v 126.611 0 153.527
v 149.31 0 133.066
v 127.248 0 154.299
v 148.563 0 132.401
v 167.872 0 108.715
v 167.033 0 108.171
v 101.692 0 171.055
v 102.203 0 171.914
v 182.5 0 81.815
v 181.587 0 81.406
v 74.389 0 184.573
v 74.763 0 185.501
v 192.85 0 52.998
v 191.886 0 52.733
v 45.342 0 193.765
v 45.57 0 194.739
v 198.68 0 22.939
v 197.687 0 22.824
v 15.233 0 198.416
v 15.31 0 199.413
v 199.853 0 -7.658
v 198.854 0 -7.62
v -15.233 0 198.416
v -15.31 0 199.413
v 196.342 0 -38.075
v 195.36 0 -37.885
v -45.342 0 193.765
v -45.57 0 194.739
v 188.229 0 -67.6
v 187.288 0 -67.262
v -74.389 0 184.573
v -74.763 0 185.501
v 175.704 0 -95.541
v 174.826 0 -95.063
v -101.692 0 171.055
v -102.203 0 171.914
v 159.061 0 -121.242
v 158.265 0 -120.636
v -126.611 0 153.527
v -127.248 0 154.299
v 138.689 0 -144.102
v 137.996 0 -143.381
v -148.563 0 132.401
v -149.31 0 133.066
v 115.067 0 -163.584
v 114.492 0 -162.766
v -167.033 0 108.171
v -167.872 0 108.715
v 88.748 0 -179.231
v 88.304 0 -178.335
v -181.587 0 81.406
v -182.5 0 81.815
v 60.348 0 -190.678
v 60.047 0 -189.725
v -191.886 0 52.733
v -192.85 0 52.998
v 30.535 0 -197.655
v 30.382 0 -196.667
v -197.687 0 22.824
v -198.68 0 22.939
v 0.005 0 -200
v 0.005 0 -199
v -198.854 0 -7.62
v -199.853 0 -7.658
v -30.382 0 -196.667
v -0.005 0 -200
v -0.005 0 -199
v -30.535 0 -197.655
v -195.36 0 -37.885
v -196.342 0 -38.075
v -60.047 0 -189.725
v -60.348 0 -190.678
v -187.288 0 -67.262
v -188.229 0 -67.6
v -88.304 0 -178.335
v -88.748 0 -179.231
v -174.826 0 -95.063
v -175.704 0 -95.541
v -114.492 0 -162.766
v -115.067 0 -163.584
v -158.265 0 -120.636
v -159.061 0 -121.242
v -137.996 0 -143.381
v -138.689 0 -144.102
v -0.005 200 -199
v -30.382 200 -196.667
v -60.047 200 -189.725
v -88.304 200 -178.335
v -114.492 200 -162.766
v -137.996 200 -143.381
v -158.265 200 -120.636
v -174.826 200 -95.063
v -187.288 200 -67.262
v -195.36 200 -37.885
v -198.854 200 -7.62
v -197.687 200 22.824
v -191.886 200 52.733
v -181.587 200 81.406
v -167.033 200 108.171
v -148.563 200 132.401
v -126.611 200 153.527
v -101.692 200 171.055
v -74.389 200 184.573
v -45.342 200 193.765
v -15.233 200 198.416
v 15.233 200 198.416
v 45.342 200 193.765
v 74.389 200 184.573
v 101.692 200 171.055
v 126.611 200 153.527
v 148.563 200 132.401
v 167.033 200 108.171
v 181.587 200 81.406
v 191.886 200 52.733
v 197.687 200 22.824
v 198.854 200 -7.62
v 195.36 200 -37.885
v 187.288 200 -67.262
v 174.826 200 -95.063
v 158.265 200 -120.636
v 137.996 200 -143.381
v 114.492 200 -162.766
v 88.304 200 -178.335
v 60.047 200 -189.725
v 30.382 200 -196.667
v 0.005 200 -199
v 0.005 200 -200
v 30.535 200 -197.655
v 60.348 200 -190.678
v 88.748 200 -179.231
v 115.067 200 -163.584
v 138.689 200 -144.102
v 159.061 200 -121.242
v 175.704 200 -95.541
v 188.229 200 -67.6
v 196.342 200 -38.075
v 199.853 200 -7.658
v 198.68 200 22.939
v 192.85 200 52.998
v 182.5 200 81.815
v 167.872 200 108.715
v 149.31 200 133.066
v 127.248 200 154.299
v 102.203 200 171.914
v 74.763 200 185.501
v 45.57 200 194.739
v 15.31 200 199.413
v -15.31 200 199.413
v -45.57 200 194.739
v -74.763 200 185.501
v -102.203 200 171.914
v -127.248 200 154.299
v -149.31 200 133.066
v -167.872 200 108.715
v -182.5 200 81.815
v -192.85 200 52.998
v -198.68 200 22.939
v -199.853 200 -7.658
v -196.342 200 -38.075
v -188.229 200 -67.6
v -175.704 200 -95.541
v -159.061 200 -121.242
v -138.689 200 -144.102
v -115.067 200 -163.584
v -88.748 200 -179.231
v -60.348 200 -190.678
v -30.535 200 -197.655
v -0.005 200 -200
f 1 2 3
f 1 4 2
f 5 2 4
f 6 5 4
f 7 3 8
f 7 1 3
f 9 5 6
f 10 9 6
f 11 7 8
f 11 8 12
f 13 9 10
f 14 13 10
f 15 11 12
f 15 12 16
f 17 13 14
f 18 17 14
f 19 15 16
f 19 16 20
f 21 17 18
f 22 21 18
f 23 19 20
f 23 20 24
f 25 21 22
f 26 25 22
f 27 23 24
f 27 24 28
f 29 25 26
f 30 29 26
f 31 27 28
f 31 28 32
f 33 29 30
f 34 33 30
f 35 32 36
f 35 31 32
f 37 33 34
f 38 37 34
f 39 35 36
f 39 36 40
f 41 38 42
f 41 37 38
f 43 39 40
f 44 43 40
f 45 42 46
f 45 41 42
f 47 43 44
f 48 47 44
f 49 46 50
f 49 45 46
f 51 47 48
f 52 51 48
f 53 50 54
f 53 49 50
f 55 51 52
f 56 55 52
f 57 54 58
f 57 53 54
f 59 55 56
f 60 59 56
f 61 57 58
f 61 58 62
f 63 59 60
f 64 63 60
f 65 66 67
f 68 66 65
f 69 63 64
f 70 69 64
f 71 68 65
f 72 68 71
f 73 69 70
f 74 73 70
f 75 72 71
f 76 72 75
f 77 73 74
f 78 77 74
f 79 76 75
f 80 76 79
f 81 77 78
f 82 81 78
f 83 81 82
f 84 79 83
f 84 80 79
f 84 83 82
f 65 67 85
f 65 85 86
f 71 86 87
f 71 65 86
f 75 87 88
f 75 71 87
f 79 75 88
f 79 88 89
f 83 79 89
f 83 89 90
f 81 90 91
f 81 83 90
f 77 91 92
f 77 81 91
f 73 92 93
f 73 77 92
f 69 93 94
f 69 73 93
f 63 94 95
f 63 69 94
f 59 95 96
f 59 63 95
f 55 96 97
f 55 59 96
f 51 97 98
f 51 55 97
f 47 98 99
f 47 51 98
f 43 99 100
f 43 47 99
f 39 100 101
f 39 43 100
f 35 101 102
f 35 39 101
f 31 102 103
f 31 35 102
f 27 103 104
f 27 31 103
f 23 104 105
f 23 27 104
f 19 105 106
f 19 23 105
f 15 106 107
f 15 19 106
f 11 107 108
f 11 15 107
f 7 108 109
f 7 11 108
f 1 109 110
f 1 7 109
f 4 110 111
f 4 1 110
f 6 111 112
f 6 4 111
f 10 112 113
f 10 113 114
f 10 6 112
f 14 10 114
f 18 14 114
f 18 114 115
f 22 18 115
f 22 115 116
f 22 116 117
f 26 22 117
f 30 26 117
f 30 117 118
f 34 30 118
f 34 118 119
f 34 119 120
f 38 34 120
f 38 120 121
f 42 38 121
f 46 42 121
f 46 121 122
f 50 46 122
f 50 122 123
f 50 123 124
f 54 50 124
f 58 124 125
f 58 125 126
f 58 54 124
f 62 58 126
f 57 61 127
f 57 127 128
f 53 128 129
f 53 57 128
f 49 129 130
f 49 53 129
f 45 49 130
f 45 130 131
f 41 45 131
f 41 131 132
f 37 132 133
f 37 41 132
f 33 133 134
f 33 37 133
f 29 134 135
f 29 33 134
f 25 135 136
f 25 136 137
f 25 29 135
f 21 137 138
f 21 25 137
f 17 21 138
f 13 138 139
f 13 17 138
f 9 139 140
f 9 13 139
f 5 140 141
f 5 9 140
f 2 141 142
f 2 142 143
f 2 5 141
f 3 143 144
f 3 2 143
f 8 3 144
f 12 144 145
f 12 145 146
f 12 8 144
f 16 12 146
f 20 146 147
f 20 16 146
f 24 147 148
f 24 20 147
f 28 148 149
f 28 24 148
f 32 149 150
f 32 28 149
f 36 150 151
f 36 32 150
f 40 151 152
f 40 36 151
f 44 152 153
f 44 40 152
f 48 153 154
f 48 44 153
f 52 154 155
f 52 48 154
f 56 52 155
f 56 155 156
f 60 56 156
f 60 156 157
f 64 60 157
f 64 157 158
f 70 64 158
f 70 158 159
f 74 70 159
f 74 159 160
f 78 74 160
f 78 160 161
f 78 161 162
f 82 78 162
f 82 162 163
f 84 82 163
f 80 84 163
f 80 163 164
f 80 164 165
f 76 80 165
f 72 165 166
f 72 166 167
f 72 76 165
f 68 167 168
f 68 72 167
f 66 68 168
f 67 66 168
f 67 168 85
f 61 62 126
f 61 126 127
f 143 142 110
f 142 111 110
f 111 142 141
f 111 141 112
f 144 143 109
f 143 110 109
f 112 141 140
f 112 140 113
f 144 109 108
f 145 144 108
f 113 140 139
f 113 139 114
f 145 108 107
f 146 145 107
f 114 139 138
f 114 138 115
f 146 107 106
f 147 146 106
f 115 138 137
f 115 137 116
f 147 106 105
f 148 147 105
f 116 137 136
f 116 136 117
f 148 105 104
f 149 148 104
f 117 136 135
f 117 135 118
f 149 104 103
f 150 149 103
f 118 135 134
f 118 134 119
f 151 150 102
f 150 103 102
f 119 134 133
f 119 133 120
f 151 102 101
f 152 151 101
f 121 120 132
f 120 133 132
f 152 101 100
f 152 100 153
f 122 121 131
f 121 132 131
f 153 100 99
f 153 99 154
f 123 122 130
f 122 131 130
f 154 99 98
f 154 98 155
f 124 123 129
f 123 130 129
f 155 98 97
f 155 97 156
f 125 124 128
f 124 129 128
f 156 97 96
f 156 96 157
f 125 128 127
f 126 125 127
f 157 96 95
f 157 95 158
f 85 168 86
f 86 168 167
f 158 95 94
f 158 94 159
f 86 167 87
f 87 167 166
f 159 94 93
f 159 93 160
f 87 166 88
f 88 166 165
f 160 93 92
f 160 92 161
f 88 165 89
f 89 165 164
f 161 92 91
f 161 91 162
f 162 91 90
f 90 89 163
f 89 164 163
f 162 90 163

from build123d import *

# Parameters (mm, degrees)
BASE_FLANGE1_DEPTH                    = 200
BASE_FLANGE2_START                    = -1.5
BASE_FLANGE2_DEPTH                    = 1.5
SKETCH9_W                             = 6.25
SKETCH9_H                             = 1.5
F_12_5_12_5_DIAMETER_HOLE2_AT_2_COUNT = 2
F_12_5_12_5_DIAMETER_HOLE2_AT_2_PITCH = 250
F_12_5_12_5_DIAMETER_HOLE2_AT_3_COUNT = 2
F_12_5_12_5_DIAMETER_HOLE2_AT_3_PITCH = 125
F_12_5_12_5_DIAMETER_HOLE2_AT_4_COUNT = 2
F_12_5_12_5_DIAMETER_HOLE2_AT_4_PITCH = 465.111814513
F_12_5_12_5_DIAMETER_HOLE2_AT_5_COUNT = 2
F_12_5_12_5_DIAMETER_HOLE2_AT_5_PITCH = 513.034111926
F_12_5_12_5_DIAMETER_HOLE2_AT_6_COUNT = 2
F_12_5_12_5_DIAMETER_HOLE2_AT_6_PITCH = 448
SKETCH11_W                            = 6.25
SKETCH11_H                            = 1.5
F_12_5_12_5_DIAMETER_HOLE3_AT_2_COUNT = 2
F_12_5_12_5_DIAMETER_HOLE3_AT_2_PITCH = 332
CRVPATTERN1_COUNT                     = 4
CRVPATTERN1_PITCH                     = 125
CRVPATTERN1_COPY_1_SKETCH_W           = 6.25
CRVPATTERN1_COPY_1_SKETCH_H           = 1.5
CRVPATTERN1_COPY_2_SKETCH_W           = 6.25
CRVPATTERN1_COPY_2_SKETCH_H           = 1.5
CRVPATTERN1_COPY_3_SKETCH_W           = 6.25
CRVPATTERN1_COPY_3_SKETCH_H           = 1.5
BASE_FLANGE3_DEPTH                    = 1.5
SKETCH14_W                            = 80
SKETCH14_H                            = 6
SKETCH14_W_2                          = 50
EXTRUDE1_DEPTH                        = 10
CRVPATTERN2_START                     = -81.5
CRVPATTERN2_OUTLINE_W                 = 1.5
CRVPATTERN2_OUTLINE_H                 = 6
CRVPATTERN2_DEPTH                     = 80
CRVPATTERN2_START_2                   = -134.5
CRVPATTERN2_2_OUTLINE_W               = 1.5
CRVPATTERN2_2_OUTLINE_H               = 6
CRVPATTERN2_2_DEPTH                   = 50
SKETCH15_W                            = 6
SKETCH15_H                            = 80
SKETCH15_H_2                          = 50
SKETCH15_H_3                          = 30
SKETCH15_W_2                          = 10
SKETCH15_H_4                          = 10
EXTRUDE2_DEPTH                        = 10


# Read off the part's stored shape, not the designer's step: CrvPattern2
# Sheet-metal steps are written as plain solids
with BuildPart() as part:
    # Sketch1 → Base-Flange1 (new body)
    with BuildSketch(Plane(origin=(0, 0, 0), x_dir=(1, 0, 0), z_dir=(0, 1, 0))):
        with BuildLine():
            ThreePointArc((-0.005, 198.999999937), (0, -199), (0.005, 198.999999937))
            Line((0.005, 198.999999937), (0.005025126, 199.999999937))
            ThreePointArc((0.005025126, 199.999999937), (0, -200), (-0.005025126, 199.999999937))
            Line((-0.005025126, 199.999999937), (-0.005, 198.999999937))
        make_face()
    extrude(amount=BASE_FLANGE1_DEPTH)


with BuildPart() as body_2:
    # Sketch4 → Base-Flange2 (new body)
    with BuildSketch(Plane(origin=(0, 0, 0), x_dir=(1, 0, 0), z_dir=(0, 1, 0)).offset(BASE_FLANGE2_START)):
        Polygon((240, 180), (240, -180), (0, -220), (-240, -180), (-240, 180), (0, 220), align=None)
        with BuildLine():
            Line((143.038535018, 140), (-142.828568571, 140))
            ThreePointArc((-142.828568571, 140), (-200, 0), (-142.828568571, -140))
            Line((-142.828568571, -140), (143.038535018, -140))
            ThreePointArc((143.038535018, -140), (200.15, 0), (143.038535018, 140))
        make_face(mode=Mode.SUBTRACT)
    extrude(amount=BASE_FLANGE2_DEPTH)

    # Sketch9 → Ø12.5 (12.5) Diameter Hole2 (revolve, cut)
    with BuildSketch(Plane(origin=(-224, 0, -125), x_dir=(0, 0, 1), z_dir=(1, 0, 0))):
        with Locations((3.125, 0.75)):
            Rectangle(SKETCH9_W, SKETCH9_H)
    f_12_5_12_5_diameter_hole2 = revolve(axis=Axis((-224, 6.35, -125), (0, -1, 0)), mode=Mode.SUBTRACT)

    # Ø12.5 (12.5) Diameter Hole2 at 2: Ø12.5 (12.5) Diameter Hole2 ×2
    with Locations(*[(0, 0, i * F_12_5_12_5_DIAMETER_HOLE2_AT_2_PITCH) for i in range(1, F_12_5_12_5_DIAMETER_HOLE2_AT_2_COUNT)]):
        add(f_12_5_12_5_diameter_hole2, mode=Mode.SUBTRACT)

    # Ø12.5 (12.5) Diameter Hole2 at 3: Ø12.5 (12.5) Diameter Hole2 ×2
    with Locations(*[(0, 0, i * F_12_5_12_5_DIAMETER_HOLE2_AT_3_PITCH) for i in range(1, F_12_5_12_5_DIAMETER_HOLE2_AT_3_COUNT)]):
        add(f_12_5_12_5_diameter_hole2, mode=Mode.SUBTRACT)

    # Ø12.5 (12.5) Diameter Hole2 at 4: Ø12.5 (12.5) Diameter Hole2 ×2
    with Locations(*[Vector(0.9632092456491202, 0, 0.2687525797012055) * (i * F_12_5_12_5_DIAMETER_HOLE2_AT_4_PITCH) for i in range(1, F_12_5_12_5_DIAMETER_HOLE2_AT_4_COUNT)]):
        add(f_12_5_12_5_diameter_hole2, mode=Mode.SUBTRACT)

    # Ø12.5 (12.5) Diameter Hole2 at 5: Ø12.5 (12.5) Diameter Hole2 ×2
    with Locations(*[Vector(0.8732362811468641, 0, 0.4872970318899912) * (i * F_12_5_12_5_DIAMETER_HOLE2_AT_5_PITCH) for i in range(1, F_12_5_12_5_DIAMETER_HOLE2_AT_5_COUNT)]):
        add(f_12_5_12_5_diameter_hole2, mode=Mode.SUBTRACT)

    # Ø12.5 (12.5) Diameter Hole2 at 6: Ø12.5 (12.5) Diameter Hole2 ×2
    with Locations(*[(i * F_12_5_12_5_DIAMETER_HOLE2_AT_6_PITCH, 0, 0) for i in range(1, F_12_5_12_5_DIAMETER_HOLE2_AT_6_COUNT)]):
        add(f_12_5_12_5_diameter_hole2, mode=Mode.SUBTRACT)

    # Sketch11 → Ø12.5 (12.5) Diameter Hole3 (revolve, cut)
    with BuildSketch(Plane(origin=(-187.5, 0, -166), x_dir=(0, 0, 1), z_dir=(1, 0, 0))):
        with Locations((3.125, 0.75)):
            Rectangle(SKETCH11_W, SKETCH11_H)
    f_12_5_12_5_diameter_hole3 = revolve(axis=Axis((-187.5, 6.35, -166), (0, -1, 0)), mode=Mode.SUBTRACT)

    # Ø12.5 (12.5) Diameter Hole3 at 2: Ø12.5 (12.5) Diameter Hole3 ×2
    with Locations(*[(0, 0, i * F_12_5_12_5_DIAMETER_HOLE3_AT_2_PITCH) for i in range(1, F_12_5_12_5_DIAMETER_HOLE3_AT_2_COUNT)]):
        add(f_12_5_12_5_diameter_hole3, mode=Mode.SUBTRACT)

    # CrvPattern1: Ø12.5 (12.5) Diameter Hole3 ×4
    with Locations(*[(i * CRVPATTERN1_PITCH, 0, 0) for i in range(1, CRVPATTERN1_COUNT)]):
        add(f_12_5_12_5_diameter_hole3, mode=Mode.SUBTRACT)

    # CrvPattern1 copy 1 sketch → CrvPattern1 copy 1 (revolve, cut)
    with BuildSketch(Plane(origin=(-62.5, 0, 166), x_dir=(0, 0, 1), z_dir=(1, 0, 0))):
        with Locations((3.125, 0.75)):
            Rectangle(CRVPATTERN1_COPY_1_SKETCH_W, CRVPATTERN1_COPY_1_SKETCH_H)
    revolve(axis=Axis((-62.5, 6.35, 166), (0, -1, 0)), mode=Mode.SUBTRACT)

    # CrvPattern1 copy 2 sketch → CrvPattern1 copy 2 (revolve, cut)
    with BuildSketch(Plane(origin=(62.5, 0, 166), x_dir=(0, 0, 1), z_dir=(1, 0, 0))):
        with Locations((3.125, 0.75)):
            Rectangle(CRVPATTERN1_COPY_2_SKETCH_W, CRVPATTERN1_COPY_2_SKETCH_H)
    revolve(axis=Axis((62.5, 6.35, 166), (0, -1, 0)), mode=Mode.SUBTRACT)

    # CrvPattern1 copy 3 sketch → CrvPattern1 copy 3 (revolve, cut)
    with BuildSketch(Plane(origin=(187.5, 0, 166), x_dir=(0, 0, 1), z_dir=(1, 0, 0))):
        with Locations((3.125, 0.75)):
            Rectangle(CRVPATTERN1_COPY_3_SKETCH_W, CRVPATTERN1_COPY_3_SKETCH_H)
    revolve(axis=Axis((187.5, 6.35, 166), (0, -1, 0)), mode=Mode.SUBTRACT)

    # Sketch13 → Base-Flange3 (add)
    with BuildSketch(Plane.XZ.offset(1.5)):
        with BuildLine():
            Line((-142.828568571, -140), (143.038535018, -140))
            ThreePointArc((143.038535018, -140), (200.15, 0), (143.038535018, 140))
            Line((143.038535018, 140), (-142.828568571, 140))
            ThreePointArc((-142.828568571, 140), (-200, 0), (-142.828568571, -140))
        make_face()
    extrude(amount=-BASE_FLANGE3_DEPTH)

    # Sketch14 → Extrude1 (cut)
    with BuildSketch(Plane(origin=(0, 0, 0), x_dir=(1, 0, 0), z_dir=(0, 1, 0))):
        with Locations((-41.5, 137)):
            Rectangle(SKETCH14_W, SKETCH14_H)
        with Locations((-109.5, 137)):
            Rectangle(SKETCH14_W_2, SKETCH14_H)
    extrude1 = extrude(amount=-EXTRUDE1_DEPTH, mode=Mode.SUBTRACT)

    # CrvPattern2 outline → CrvPattern2 (cut)
    with BuildSketch(Plane.YZ.offset(CRVPATTERN2_START)):
        with Locations((-0.75, -127.866666667)):
            Rectangle(CRVPATTERN2_OUTLINE_W, CRVPATTERN2_OUTLINE_H)
        with Locations((-0.75, -118.733333333)):
            Rectangle(CRVPATTERN2_OUTLINE_W, CRVPATTERN2_OUTLINE_H)
        with Locations((-0.75, -109.6)):
            Rectangle(CRVPATTERN2_OUTLINE_W, CRVPATTERN2_OUTLINE_H)
        with Locations((-0.75, -100.466666667)):
            Rectangle(CRVPATTERN2_OUTLINE_W, CRVPATTERN2_OUTLINE_H)
        with Locations((-0.75, -91.333333333)):
            Rectangle(CRVPATTERN2_OUTLINE_W, CRVPATTERN2_OUTLINE_H)
        with Locations((-0.75, -82.2)):
            Rectangle(CRVPATTERN2_OUTLINE_W, CRVPATTERN2_OUTLINE_H)
        with Locations((-0.75, -73.066666667)):
            Rectangle(CRVPATTERN2_OUTLINE_W, CRVPATTERN2_OUTLINE_H)
        with Locations((-0.75, -63.933333333)):
            Rectangle(CRVPATTERN2_OUTLINE_W, CRVPATTERN2_OUTLINE_H)
        with Locations((-0.75, -54.8)):
            Rectangle(CRVPATTERN2_OUTLINE_W, CRVPATTERN2_OUTLINE_H)
        with Locations((-0.75, -45.666666667)):
            Rectangle(CRVPATTERN2_OUTLINE_W, CRVPATTERN2_OUTLINE_H)
        with Locations((-0.75, -36.533333333)):
            Rectangle(CRVPATTERN2_OUTLINE_W, CRVPATTERN2_OUTLINE_H)
        with Locations((-0.75, -27.4)):
            Rectangle(CRVPATTERN2_OUTLINE_W, CRVPATTERN2_OUTLINE_H)
        with Locations((-0.75, -18.266666667)):
            Rectangle(CRVPATTERN2_OUTLINE_W, CRVPATTERN2_OUTLINE_H)
        with Locations((-0.75, -9.133333333)):
            Rectangle(CRVPATTERN2_OUTLINE_W, CRVPATTERN2_OUTLINE_H)
        with Locations((-0.75, 0)):
            Rectangle(CRVPATTERN2_OUTLINE_W, CRVPATTERN2_OUTLINE_H)
        with Locations((-0.75, 9.133333333)):
            Rectangle(CRVPATTERN2_OUTLINE_W, CRVPATTERN2_OUTLINE_H)
        with Locations((-0.75, 18.266666667)):
            Rectangle(CRVPATTERN2_OUTLINE_W, CRVPATTERN2_OUTLINE_H)
        with Locations((-0.75, 27.4)):
            Rectangle(CRVPATTERN2_OUTLINE_W, CRVPATTERN2_OUTLINE_H)
        with Locations((-0.75, 36.533333333)):
            Rectangle(CRVPATTERN2_OUTLINE_W, CRVPATTERN2_OUTLINE_H)
        with Locations((-0.75, 45.666666667)):
            Rectangle(CRVPATTERN2_OUTLINE_W, CRVPATTERN2_OUTLINE_H)
        with Locations((-0.75, 54.8)):
            Rectangle(CRVPATTERN2_OUTLINE_W, CRVPATTERN2_OUTLINE_H)
        with Locations((-0.75, 63.933333333)):
            Rectangle(CRVPATTERN2_OUTLINE_W, CRVPATTERN2_OUTLINE_H)
        with Locations((-0.75, 73.066666667)):
            Rectangle(CRVPATTERN2_OUTLINE_W, CRVPATTERN2_OUTLINE_H)
        with Locations((-0.75, 82.2)):
            Rectangle(CRVPATTERN2_OUTLINE_W, CRVPATTERN2_OUTLINE_H)
        with Locations((-0.75, 91.333333333)):
            Rectangle(CRVPATTERN2_OUTLINE_W, CRVPATTERN2_OUTLINE_H)
        with Locations((-0.75, 100.466666667)):
            Rectangle(CRVPATTERN2_OUTLINE_W, CRVPATTERN2_OUTLINE_H)
        with Locations((-0.75, 109.6)):
            Rectangle(CRVPATTERN2_OUTLINE_W, CRVPATTERN2_OUTLINE_H)
        with Locations((-0.75, 118.733333333)):
            Rectangle(CRVPATTERN2_OUTLINE_W, CRVPATTERN2_OUTLINE_H)
        with Locations((-0.75, 127.866666667)):
            Rectangle(CRVPATTERN2_OUTLINE_W, CRVPATTERN2_OUTLINE_H)
        with Locations((-0.75, 137)):
            Rectangle(CRVPATTERN2_OUTLINE_W, CRVPATTERN2_OUTLINE_H)
    crvpattern2 = extrude(amount=CRVPATTERN2_DEPTH, mode=Mode.SUBTRACT)

    # CrvPattern2 2 outline → CrvPattern2 2 (cut)
    with BuildSketch(Plane.YZ.offset(CRVPATTERN2_START_2)):
        with Locations((-0.75, -127.866666667)):
            Rectangle(CRVPATTERN2_2_OUTLINE_W, CRVPATTERN2_2_OUTLINE_H)
        with Locations((-0.75, -118.733333333)):
            Rectangle(CRVPATTERN2_2_OUTLINE_W, CRVPATTERN2_2_OUTLINE_H)
        with Locations((-0.75, -109.6)):
            Rectangle(CRVPATTERN2_2_OUTLINE_W, CRVPATTERN2_2_OUTLINE_H)
        with Locations((-0.75, -100.466666667)):
            Rectangle(CRVPATTERN2_2_OUTLINE_W, CRVPATTERN2_2_OUTLINE_H)
        with Locations((-0.75, -91.333333333)):
            Rectangle(CRVPATTERN2_2_OUTLINE_W, CRVPATTERN2_2_OUTLINE_H)
        with Locations((-0.75, -82.2)):
            Rectangle(CRVPATTERN2_2_OUTLINE_W, CRVPATTERN2_2_OUTLINE_H)
        with Locations((-0.75, -73.066666667)):
            Rectangle(CRVPATTERN2_2_OUTLINE_W, CRVPATTERN2_2_OUTLINE_H)
        with Locations((-0.75, -63.933333333)):
            Rectangle(CRVPATTERN2_2_OUTLINE_W, CRVPATTERN2_2_OUTLINE_H)
        with Locations((-0.75, -54.8)):
            Rectangle(CRVPATTERN2_2_OUTLINE_W, CRVPATTERN2_2_OUTLINE_H)
        with Locations((-0.75, -45.666666667)):
            Rectangle(CRVPATTERN2_2_OUTLINE_W, CRVPATTERN2_2_OUTLINE_H)
        with Locations((-0.75, -36.533333333)):
            Rectangle(CRVPATTERN2_2_OUTLINE_W, CRVPATTERN2_2_OUTLINE_H)
        with Locations((-0.75, -27.4)):
            Rectangle(CRVPATTERN2_2_OUTLINE_W, CRVPATTERN2_2_OUTLINE_H)
        with Locations((-0.75, -18.266666667)):
            Rectangle(CRVPATTERN2_2_OUTLINE_W, CRVPATTERN2_2_OUTLINE_H)
        with Locations((-0.75, -9.133333333)):
            Rectangle(CRVPATTERN2_2_OUTLINE_W, CRVPATTERN2_2_OUTLINE_H)
        with Locations((-0.75, 0)):
            Rectangle(CRVPATTERN2_2_OUTLINE_W, CRVPATTERN2_2_OUTLINE_H)
        with Locations((-0.75, 9.133333333)):
            Rectangle(CRVPATTERN2_2_OUTLINE_W, CRVPATTERN2_2_OUTLINE_H)
        with Locations((-0.75, 18.266666667)):
            Rectangle(CRVPATTERN2_2_OUTLINE_W, CRVPATTERN2_2_OUTLINE_H)
        with Locations((-0.75, 27.4)):
            Rectangle(CRVPATTERN2_2_OUTLINE_W, CRVPATTERN2_2_OUTLINE_H)
        with Locations((-0.75, 36.533333333)):
            Rectangle(CRVPATTERN2_2_OUTLINE_W, CRVPATTERN2_2_OUTLINE_H)
        with Locations((-0.75, 45.666666667)):
            Rectangle(CRVPATTERN2_2_OUTLINE_W, CRVPATTERN2_2_OUTLINE_H)
        with Locations((-0.75, 54.8)):
            Rectangle(CRVPATTERN2_2_OUTLINE_W, CRVPATTERN2_2_OUTLINE_H)
        with Locations((-0.75, 63.933333333)):
            Rectangle(CRVPATTERN2_2_OUTLINE_W, CRVPATTERN2_2_OUTLINE_H)
        with Locations((-0.75, 73.066666667)):
            Rectangle(CRVPATTERN2_2_OUTLINE_W, CRVPATTERN2_2_OUTLINE_H)
        with Locations((-0.75, 82.2)):
            Rectangle(CRVPATTERN2_2_OUTLINE_W, CRVPATTERN2_2_OUTLINE_H)
        with Locations((-0.75, 91.333333333)):
            Rectangle(CRVPATTERN2_2_OUTLINE_W, CRVPATTERN2_2_OUTLINE_H)
        with Locations((-0.75, 100.466666667)):
            Rectangle(CRVPATTERN2_2_OUTLINE_W, CRVPATTERN2_2_OUTLINE_H)
        with Locations((-0.75, 109.6)):
            Rectangle(CRVPATTERN2_2_OUTLINE_W, CRVPATTERN2_2_OUTLINE_H)
        with Locations((-0.75, 118.733333333)):
            Rectangle(CRVPATTERN2_2_OUTLINE_W, CRVPATTERN2_2_OUTLINE_H)
        with Locations((-0.75, 127.866666667)):
            Rectangle(CRVPATTERN2_2_OUTLINE_W, CRVPATTERN2_2_OUTLINE_H)
        with Locations((-0.75, 137)):
            Rectangle(CRVPATTERN2_2_OUTLINE_W, CRVPATTERN2_2_OUTLINE_H)
    crvpattern2_2 = extrude(amount=CRVPATTERN2_2_DEPTH, mode=Mode.SUBTRACT)

    # Sketch15 → Extrude2 (cut)
    with BuildSketch(Plane(origin=(0, 0, 0), x_dir=(1, 0, 0), z_dir=(0, 1, 0))):
        with Locations((-140.5, 41.5)):
            Rectangle(SKETCH15_W, SKETCH15_H)
        with Locations((-140.5, 109.5)):
            Rectangle(SKETCH15_W, SKETCH15_H_2)
        with Locations((-149.5, 41.5)):
            Rectangle(SKETCH15_W, SKETCH15_H)
        with Locations((-149.5, 109.5)):
            Rectangle(SKETCH15_W, SKETCH15_H_2)
        with Locations((-158.5, 41.5)):
            Rectangle(SKETCH15_W, SKETCH15_H)
        with Locations((-167.5, 41.5)):
            Rectangle(SKETCH15_W, SKETCH15_H)
        with Locations((-176.5, 41.5)):
            Rectangle(SKETCH15_W, SKETCH15_H)
        with Locations((-185.5, 41.5)):
            Rectangle(SKETCH15_W, SKETCH15_H)
        with Locations((-158.5, 99.5)):
            Rectangle(SKETCH15_W, SKETCH15_H_3)
        with Locations((-169.5, 89.5)):
            Rectangle(SKETCH15_W_2, SKETCH15_H_4)
        with Locations((-169.5, -89.5)):
            Rectangle(SKETCH15_W_2, SKETCH15_H_4)
        with Locations((-158.5, -99.5)):
            Rectangle(SKETCH15_W, SKETCH15_H_3)
        with Locations((-185.5, -41.5)):
            Rectangle(SKETCH15_W, SKETCH15_H)
        with Locations((-176.5, -41.5)):
            Rectangle(SKETCH15_W, SKETCH15_H)
        with Locations((-167.5, -41.5)):
            Rectangle(SKETCH15_W, SKETCH15_H)
        with Locations((-158.5, -41.5)):
            Rectangle(SKETCH15_W, SKETCH15_H)
        with Locations((-149.5, -109.5)):
            Rectangle(SKETCH15_W, SKETCH15_H_2)
        with Locations((-149.5, -41.5)):
            Rectangle(SKETCH15_W, SKETCH15_H)
        with Locations((-140.5, -109.5)):
            Rectangle(SKETCH15_W, SKETCH15_H_2)
        with Locations((-140.5, -41.5)):
            Rectangle(SKETCH15_W, SKETCH15_H)
        with Locations((-194.5, 0)):
            Rectangle(SKETCH15_W, SKETCH15_H)
    extrude2 = extrude(amount=-EXTRUDE2_DEPTH, mode=Mode.SUBTRACT)

    # Mirror1: Extrude1, CrvPattern2, CrvPattern2 2, Extrude2 across plane
    add(extrude1.mirror(Plane(origin=(0, 0, 0), x_dir=(0, 0, 1), z_dir=(1, 0, 0))), mode=Mode.SUBTRACT)
    add(crvpattern2.mirror(Plane(origin=(0, 0, 0), x_dir=(0, 0, 1), z_dir=(1, 0, 0))), mode=Mode.SUBTRACT)
    add(crvpattern2_2.mirror(Plane(origin=(0, 0, 0), x_dir=(0, 0, 1), z_dir=(1, 0, 0))), mode=Mode.SUBTRACT)
    add(extrude2.mirror(Plane(origin=(0, 0, 0), x_dir=(0, 0, 1), z_dir=(1, 0, 0))), mode=Mode.SUBTRACT)


solid = part.part
